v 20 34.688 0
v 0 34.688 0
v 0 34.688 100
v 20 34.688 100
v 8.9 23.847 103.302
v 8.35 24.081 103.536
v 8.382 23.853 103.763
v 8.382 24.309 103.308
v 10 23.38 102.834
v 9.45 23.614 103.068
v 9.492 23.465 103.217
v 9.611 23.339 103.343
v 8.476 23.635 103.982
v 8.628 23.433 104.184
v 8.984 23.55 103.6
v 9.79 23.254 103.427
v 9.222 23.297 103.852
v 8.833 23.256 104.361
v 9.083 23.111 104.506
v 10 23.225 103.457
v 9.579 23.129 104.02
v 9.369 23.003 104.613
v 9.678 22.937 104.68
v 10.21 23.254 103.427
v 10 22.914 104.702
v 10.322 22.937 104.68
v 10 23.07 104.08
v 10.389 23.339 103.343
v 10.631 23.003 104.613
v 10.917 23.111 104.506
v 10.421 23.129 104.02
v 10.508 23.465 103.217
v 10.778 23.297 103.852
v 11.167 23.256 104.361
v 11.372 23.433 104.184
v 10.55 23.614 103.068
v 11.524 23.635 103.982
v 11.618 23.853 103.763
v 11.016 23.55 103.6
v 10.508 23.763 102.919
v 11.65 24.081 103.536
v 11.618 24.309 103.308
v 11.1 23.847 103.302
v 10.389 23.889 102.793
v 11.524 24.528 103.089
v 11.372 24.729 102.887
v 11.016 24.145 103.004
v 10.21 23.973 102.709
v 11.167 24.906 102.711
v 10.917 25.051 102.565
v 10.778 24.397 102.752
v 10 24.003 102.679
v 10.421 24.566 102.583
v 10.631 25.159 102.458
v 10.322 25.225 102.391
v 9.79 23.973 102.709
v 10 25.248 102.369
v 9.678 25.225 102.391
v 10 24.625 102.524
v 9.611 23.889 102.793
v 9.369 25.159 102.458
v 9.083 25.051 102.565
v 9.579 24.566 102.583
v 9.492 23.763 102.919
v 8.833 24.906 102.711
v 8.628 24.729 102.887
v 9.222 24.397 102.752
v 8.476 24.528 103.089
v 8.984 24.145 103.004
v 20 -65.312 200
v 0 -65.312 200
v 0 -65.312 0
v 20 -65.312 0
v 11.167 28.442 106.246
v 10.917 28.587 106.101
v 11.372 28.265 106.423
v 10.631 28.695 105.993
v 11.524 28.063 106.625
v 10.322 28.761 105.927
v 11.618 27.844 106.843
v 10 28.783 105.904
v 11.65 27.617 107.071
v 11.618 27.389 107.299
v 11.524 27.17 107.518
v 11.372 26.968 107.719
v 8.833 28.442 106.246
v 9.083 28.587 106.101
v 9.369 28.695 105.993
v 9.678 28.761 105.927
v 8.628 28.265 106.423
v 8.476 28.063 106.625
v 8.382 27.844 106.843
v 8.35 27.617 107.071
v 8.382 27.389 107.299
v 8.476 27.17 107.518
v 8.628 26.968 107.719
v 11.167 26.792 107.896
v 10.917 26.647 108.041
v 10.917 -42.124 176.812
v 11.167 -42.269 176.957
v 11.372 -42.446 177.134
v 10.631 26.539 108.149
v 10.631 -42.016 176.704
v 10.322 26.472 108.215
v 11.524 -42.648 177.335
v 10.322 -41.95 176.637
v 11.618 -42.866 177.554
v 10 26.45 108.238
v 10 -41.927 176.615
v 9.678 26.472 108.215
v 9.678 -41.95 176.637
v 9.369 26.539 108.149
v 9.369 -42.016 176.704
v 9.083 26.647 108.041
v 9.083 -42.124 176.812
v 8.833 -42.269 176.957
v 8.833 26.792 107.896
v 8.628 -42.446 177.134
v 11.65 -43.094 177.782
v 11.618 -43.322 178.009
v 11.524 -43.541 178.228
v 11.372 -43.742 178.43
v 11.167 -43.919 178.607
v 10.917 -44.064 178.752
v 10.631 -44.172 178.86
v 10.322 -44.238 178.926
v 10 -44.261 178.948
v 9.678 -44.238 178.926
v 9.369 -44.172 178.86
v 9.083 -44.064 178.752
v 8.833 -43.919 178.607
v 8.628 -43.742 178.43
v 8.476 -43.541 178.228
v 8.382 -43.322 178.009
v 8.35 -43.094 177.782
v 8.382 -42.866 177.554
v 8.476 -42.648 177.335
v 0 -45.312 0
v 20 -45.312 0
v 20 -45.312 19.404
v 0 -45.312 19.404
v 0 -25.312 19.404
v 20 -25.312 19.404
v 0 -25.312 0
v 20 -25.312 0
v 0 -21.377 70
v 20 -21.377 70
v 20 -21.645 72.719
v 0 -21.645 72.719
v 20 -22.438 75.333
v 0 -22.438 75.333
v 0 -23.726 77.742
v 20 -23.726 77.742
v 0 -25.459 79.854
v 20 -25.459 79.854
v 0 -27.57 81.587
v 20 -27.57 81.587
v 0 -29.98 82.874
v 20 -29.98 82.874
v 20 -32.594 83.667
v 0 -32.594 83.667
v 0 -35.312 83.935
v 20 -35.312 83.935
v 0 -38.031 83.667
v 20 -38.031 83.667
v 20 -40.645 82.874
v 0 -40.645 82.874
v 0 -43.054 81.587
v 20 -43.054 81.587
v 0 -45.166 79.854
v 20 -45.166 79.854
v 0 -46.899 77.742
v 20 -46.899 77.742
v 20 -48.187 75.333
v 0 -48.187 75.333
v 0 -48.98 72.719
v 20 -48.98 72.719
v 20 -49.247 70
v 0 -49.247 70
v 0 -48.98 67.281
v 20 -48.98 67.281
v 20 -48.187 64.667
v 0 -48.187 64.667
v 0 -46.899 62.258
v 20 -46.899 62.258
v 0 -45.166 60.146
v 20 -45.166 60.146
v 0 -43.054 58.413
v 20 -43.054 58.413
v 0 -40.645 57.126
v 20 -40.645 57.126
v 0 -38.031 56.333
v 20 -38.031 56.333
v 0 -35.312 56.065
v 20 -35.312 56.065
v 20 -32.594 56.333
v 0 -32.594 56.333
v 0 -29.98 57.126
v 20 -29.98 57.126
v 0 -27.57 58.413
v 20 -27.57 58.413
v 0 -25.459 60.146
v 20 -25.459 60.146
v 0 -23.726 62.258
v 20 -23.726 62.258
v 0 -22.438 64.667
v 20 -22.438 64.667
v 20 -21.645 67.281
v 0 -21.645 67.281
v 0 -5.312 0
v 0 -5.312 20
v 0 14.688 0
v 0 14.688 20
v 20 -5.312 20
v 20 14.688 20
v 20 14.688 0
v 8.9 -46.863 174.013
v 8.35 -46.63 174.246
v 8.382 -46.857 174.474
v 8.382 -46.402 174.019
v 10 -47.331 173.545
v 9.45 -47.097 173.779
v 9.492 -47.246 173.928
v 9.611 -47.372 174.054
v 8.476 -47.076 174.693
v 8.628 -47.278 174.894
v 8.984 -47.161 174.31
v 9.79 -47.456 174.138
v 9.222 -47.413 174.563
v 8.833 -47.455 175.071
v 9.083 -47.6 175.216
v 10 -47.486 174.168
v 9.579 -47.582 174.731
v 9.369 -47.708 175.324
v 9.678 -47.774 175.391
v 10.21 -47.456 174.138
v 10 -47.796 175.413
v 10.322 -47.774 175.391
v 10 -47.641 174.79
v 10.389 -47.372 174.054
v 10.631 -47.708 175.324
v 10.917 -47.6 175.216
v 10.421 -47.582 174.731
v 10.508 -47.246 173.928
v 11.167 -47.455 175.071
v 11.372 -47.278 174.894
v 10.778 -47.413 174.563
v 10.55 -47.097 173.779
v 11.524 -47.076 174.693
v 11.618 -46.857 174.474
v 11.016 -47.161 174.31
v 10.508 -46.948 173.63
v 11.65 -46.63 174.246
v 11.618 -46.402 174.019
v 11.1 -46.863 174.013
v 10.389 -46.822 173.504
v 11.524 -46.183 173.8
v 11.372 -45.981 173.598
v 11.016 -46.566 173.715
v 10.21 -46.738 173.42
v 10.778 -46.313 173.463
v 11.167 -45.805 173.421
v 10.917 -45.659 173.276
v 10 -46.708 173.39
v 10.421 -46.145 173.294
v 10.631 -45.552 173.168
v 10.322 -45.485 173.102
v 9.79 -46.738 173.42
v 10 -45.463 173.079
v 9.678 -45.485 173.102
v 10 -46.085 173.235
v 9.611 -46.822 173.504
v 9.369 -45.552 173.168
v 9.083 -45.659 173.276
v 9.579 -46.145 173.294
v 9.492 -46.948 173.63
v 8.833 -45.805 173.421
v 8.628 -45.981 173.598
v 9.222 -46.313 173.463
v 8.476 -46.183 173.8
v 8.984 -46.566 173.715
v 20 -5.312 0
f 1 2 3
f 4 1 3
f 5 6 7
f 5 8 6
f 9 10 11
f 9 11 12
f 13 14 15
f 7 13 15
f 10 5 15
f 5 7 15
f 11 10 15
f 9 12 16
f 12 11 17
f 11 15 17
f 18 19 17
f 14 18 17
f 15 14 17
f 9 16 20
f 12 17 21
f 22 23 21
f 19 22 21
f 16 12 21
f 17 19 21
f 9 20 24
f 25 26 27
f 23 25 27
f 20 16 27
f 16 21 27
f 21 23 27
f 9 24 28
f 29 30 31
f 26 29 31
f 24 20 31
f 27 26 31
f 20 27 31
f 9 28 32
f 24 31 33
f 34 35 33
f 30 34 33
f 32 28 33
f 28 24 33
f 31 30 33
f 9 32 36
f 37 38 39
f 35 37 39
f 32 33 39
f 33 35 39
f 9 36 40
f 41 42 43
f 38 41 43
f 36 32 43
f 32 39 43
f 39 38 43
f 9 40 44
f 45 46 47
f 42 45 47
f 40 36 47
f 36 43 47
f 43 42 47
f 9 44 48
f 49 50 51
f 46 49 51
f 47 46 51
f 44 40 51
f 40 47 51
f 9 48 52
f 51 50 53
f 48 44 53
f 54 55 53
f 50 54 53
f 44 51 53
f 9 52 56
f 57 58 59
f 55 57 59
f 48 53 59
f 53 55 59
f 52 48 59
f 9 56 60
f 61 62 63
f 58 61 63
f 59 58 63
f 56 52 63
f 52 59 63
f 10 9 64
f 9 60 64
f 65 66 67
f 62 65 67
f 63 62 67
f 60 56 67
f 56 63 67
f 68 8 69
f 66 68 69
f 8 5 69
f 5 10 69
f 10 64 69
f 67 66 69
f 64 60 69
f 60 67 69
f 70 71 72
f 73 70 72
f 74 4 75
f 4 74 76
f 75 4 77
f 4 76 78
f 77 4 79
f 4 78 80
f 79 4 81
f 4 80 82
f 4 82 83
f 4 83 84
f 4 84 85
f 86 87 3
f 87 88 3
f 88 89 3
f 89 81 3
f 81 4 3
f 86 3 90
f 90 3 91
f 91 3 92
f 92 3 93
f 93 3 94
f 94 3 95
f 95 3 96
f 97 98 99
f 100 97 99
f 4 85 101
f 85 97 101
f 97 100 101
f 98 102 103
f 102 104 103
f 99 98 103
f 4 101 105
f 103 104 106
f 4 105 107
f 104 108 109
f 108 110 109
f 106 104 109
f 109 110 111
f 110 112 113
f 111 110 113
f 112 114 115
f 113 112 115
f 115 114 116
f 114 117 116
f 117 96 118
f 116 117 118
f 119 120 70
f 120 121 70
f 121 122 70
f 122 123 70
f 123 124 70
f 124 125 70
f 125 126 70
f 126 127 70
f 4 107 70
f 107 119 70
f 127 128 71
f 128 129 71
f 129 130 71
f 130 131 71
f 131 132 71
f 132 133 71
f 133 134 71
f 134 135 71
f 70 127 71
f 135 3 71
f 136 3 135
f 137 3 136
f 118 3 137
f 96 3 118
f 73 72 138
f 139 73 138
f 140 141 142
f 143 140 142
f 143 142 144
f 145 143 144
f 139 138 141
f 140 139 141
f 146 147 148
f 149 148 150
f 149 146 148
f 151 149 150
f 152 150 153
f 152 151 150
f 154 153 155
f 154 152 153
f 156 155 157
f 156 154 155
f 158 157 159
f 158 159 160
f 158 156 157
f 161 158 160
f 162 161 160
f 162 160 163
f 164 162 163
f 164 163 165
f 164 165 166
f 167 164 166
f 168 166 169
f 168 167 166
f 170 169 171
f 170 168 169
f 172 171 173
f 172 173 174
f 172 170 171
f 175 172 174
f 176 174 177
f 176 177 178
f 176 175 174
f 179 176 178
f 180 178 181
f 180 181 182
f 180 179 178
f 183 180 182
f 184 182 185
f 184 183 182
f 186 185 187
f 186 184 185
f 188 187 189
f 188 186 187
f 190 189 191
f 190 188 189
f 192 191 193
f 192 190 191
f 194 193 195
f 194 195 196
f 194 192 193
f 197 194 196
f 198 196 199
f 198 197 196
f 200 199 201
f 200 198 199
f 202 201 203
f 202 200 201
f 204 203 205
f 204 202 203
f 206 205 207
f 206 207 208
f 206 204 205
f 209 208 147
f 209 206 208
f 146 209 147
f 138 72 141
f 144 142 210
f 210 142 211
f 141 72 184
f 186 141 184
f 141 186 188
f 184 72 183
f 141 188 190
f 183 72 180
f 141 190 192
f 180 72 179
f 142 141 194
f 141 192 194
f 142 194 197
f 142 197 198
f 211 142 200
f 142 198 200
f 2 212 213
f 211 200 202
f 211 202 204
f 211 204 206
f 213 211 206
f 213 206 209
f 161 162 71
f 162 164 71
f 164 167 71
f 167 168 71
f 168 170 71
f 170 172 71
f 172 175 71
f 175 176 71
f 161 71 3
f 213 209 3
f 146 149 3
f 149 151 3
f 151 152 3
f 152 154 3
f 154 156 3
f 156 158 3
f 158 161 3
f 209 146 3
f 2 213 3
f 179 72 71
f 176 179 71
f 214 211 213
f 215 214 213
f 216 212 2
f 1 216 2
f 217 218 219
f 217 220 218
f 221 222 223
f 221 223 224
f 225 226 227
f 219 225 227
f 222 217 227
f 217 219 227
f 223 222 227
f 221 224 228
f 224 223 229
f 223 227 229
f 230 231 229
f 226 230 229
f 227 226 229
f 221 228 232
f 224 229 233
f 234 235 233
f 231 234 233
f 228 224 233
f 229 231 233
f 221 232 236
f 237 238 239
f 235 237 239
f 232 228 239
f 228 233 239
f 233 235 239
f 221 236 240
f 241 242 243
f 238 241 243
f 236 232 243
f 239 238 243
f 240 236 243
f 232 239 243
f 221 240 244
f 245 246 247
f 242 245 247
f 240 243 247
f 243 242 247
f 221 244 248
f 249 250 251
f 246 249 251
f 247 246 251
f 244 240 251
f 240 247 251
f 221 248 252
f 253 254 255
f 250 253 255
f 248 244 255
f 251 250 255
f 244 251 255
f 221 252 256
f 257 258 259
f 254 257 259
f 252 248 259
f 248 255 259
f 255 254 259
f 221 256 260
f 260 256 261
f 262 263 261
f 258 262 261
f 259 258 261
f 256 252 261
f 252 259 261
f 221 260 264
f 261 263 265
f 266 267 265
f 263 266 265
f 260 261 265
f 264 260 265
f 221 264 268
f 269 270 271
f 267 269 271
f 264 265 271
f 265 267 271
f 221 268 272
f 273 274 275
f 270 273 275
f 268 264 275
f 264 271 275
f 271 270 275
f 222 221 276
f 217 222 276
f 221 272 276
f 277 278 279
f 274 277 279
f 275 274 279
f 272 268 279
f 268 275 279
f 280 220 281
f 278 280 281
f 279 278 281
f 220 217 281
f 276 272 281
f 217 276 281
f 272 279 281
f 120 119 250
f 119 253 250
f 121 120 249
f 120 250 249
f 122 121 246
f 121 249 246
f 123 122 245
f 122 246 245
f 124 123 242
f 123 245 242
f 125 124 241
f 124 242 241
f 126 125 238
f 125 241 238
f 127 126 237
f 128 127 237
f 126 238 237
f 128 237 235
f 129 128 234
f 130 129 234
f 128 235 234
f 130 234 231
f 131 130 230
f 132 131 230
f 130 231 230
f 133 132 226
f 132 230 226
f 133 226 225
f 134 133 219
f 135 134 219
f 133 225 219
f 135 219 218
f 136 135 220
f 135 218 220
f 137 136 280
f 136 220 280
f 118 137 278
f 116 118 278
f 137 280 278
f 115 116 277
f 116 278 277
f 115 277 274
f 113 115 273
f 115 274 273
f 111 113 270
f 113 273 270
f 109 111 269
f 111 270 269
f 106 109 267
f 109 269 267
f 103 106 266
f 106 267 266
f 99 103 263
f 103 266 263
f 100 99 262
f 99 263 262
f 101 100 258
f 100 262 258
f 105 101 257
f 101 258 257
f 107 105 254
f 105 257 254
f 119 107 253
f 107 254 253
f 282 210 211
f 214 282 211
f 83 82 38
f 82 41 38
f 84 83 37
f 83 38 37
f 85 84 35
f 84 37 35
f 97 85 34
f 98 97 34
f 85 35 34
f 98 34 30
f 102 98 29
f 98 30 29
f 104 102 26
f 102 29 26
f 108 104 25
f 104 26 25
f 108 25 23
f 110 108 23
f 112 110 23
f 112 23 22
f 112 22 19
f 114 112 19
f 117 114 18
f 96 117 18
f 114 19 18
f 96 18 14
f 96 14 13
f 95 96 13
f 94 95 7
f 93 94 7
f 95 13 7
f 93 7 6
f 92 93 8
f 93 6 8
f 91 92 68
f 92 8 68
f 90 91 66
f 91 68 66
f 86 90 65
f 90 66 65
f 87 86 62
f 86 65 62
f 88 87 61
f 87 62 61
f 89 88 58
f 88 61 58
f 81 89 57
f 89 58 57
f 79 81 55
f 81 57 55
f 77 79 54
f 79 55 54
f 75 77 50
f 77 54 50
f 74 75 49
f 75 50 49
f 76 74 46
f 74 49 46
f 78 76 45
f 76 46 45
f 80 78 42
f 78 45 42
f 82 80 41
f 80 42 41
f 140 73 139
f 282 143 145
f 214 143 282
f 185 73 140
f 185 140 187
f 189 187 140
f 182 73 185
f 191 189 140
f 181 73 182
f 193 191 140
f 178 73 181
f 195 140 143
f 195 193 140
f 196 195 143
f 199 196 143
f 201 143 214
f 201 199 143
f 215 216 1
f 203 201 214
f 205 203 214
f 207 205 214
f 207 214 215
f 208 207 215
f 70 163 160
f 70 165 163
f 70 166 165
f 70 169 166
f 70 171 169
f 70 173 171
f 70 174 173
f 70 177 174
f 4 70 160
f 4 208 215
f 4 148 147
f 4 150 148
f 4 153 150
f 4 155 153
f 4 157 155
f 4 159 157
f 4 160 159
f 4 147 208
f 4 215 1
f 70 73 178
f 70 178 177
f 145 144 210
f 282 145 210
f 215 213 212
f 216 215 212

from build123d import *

# Parameters (mm, degrees)
F0_R     = 13.9349821394
F1_DEPTH = 20
F3_D     = 3.3
F3_DEPTH = 5
F3_TIP   = 0.9914200214


with BuildPart() as f1:
    # F0 (on Right) → F1 (new body)
    with BuildSketch(Plane.YZ):
        Polygon((-65.3123139198, 200), (-65.3123139198, 100), (34.6876860802, 100), align=None)
        Polygon((-65.3123139198, 100), (-65.3123139198, 0), (-45.3123139198, 0), (-45.3123139198, 19.40359734), (-25.3123139198, 19.40359734), (-25.3123139198, 0), (-5.3123139198, 0), (-5.3123139198, 20), (14.6876860802, 20), (14.6876860802, 0), (34.6876860802, 0), (34.6876860802, 100), align=None)
        with Locations((-35.3123139198, 70)):
            Circle(F0_R, mode=Mode.SUBTRACT)
    extrude(amount=F1_DEPTH)

    # F3
    with Locations(Plane(origin=(0, 67.3438430401, 67.3438430401), x_dir=(-1, 0, 0), z_dir=(0, 0.7071067812, 0.7071067812))):
        with Locations((-10, 56.1827800676), (-10, 156.1827800676)):
            Hole(F3_D / 2, depth=F3_DEPTH)
            with Locations((0, 0, -(F3_DEPTH + F3_TIP / 2))):  # 118° drill point
                Cone(0, F3_D / 2, F3_TIP, mode=Mode.SUBTRACT)


solid = f1.part
